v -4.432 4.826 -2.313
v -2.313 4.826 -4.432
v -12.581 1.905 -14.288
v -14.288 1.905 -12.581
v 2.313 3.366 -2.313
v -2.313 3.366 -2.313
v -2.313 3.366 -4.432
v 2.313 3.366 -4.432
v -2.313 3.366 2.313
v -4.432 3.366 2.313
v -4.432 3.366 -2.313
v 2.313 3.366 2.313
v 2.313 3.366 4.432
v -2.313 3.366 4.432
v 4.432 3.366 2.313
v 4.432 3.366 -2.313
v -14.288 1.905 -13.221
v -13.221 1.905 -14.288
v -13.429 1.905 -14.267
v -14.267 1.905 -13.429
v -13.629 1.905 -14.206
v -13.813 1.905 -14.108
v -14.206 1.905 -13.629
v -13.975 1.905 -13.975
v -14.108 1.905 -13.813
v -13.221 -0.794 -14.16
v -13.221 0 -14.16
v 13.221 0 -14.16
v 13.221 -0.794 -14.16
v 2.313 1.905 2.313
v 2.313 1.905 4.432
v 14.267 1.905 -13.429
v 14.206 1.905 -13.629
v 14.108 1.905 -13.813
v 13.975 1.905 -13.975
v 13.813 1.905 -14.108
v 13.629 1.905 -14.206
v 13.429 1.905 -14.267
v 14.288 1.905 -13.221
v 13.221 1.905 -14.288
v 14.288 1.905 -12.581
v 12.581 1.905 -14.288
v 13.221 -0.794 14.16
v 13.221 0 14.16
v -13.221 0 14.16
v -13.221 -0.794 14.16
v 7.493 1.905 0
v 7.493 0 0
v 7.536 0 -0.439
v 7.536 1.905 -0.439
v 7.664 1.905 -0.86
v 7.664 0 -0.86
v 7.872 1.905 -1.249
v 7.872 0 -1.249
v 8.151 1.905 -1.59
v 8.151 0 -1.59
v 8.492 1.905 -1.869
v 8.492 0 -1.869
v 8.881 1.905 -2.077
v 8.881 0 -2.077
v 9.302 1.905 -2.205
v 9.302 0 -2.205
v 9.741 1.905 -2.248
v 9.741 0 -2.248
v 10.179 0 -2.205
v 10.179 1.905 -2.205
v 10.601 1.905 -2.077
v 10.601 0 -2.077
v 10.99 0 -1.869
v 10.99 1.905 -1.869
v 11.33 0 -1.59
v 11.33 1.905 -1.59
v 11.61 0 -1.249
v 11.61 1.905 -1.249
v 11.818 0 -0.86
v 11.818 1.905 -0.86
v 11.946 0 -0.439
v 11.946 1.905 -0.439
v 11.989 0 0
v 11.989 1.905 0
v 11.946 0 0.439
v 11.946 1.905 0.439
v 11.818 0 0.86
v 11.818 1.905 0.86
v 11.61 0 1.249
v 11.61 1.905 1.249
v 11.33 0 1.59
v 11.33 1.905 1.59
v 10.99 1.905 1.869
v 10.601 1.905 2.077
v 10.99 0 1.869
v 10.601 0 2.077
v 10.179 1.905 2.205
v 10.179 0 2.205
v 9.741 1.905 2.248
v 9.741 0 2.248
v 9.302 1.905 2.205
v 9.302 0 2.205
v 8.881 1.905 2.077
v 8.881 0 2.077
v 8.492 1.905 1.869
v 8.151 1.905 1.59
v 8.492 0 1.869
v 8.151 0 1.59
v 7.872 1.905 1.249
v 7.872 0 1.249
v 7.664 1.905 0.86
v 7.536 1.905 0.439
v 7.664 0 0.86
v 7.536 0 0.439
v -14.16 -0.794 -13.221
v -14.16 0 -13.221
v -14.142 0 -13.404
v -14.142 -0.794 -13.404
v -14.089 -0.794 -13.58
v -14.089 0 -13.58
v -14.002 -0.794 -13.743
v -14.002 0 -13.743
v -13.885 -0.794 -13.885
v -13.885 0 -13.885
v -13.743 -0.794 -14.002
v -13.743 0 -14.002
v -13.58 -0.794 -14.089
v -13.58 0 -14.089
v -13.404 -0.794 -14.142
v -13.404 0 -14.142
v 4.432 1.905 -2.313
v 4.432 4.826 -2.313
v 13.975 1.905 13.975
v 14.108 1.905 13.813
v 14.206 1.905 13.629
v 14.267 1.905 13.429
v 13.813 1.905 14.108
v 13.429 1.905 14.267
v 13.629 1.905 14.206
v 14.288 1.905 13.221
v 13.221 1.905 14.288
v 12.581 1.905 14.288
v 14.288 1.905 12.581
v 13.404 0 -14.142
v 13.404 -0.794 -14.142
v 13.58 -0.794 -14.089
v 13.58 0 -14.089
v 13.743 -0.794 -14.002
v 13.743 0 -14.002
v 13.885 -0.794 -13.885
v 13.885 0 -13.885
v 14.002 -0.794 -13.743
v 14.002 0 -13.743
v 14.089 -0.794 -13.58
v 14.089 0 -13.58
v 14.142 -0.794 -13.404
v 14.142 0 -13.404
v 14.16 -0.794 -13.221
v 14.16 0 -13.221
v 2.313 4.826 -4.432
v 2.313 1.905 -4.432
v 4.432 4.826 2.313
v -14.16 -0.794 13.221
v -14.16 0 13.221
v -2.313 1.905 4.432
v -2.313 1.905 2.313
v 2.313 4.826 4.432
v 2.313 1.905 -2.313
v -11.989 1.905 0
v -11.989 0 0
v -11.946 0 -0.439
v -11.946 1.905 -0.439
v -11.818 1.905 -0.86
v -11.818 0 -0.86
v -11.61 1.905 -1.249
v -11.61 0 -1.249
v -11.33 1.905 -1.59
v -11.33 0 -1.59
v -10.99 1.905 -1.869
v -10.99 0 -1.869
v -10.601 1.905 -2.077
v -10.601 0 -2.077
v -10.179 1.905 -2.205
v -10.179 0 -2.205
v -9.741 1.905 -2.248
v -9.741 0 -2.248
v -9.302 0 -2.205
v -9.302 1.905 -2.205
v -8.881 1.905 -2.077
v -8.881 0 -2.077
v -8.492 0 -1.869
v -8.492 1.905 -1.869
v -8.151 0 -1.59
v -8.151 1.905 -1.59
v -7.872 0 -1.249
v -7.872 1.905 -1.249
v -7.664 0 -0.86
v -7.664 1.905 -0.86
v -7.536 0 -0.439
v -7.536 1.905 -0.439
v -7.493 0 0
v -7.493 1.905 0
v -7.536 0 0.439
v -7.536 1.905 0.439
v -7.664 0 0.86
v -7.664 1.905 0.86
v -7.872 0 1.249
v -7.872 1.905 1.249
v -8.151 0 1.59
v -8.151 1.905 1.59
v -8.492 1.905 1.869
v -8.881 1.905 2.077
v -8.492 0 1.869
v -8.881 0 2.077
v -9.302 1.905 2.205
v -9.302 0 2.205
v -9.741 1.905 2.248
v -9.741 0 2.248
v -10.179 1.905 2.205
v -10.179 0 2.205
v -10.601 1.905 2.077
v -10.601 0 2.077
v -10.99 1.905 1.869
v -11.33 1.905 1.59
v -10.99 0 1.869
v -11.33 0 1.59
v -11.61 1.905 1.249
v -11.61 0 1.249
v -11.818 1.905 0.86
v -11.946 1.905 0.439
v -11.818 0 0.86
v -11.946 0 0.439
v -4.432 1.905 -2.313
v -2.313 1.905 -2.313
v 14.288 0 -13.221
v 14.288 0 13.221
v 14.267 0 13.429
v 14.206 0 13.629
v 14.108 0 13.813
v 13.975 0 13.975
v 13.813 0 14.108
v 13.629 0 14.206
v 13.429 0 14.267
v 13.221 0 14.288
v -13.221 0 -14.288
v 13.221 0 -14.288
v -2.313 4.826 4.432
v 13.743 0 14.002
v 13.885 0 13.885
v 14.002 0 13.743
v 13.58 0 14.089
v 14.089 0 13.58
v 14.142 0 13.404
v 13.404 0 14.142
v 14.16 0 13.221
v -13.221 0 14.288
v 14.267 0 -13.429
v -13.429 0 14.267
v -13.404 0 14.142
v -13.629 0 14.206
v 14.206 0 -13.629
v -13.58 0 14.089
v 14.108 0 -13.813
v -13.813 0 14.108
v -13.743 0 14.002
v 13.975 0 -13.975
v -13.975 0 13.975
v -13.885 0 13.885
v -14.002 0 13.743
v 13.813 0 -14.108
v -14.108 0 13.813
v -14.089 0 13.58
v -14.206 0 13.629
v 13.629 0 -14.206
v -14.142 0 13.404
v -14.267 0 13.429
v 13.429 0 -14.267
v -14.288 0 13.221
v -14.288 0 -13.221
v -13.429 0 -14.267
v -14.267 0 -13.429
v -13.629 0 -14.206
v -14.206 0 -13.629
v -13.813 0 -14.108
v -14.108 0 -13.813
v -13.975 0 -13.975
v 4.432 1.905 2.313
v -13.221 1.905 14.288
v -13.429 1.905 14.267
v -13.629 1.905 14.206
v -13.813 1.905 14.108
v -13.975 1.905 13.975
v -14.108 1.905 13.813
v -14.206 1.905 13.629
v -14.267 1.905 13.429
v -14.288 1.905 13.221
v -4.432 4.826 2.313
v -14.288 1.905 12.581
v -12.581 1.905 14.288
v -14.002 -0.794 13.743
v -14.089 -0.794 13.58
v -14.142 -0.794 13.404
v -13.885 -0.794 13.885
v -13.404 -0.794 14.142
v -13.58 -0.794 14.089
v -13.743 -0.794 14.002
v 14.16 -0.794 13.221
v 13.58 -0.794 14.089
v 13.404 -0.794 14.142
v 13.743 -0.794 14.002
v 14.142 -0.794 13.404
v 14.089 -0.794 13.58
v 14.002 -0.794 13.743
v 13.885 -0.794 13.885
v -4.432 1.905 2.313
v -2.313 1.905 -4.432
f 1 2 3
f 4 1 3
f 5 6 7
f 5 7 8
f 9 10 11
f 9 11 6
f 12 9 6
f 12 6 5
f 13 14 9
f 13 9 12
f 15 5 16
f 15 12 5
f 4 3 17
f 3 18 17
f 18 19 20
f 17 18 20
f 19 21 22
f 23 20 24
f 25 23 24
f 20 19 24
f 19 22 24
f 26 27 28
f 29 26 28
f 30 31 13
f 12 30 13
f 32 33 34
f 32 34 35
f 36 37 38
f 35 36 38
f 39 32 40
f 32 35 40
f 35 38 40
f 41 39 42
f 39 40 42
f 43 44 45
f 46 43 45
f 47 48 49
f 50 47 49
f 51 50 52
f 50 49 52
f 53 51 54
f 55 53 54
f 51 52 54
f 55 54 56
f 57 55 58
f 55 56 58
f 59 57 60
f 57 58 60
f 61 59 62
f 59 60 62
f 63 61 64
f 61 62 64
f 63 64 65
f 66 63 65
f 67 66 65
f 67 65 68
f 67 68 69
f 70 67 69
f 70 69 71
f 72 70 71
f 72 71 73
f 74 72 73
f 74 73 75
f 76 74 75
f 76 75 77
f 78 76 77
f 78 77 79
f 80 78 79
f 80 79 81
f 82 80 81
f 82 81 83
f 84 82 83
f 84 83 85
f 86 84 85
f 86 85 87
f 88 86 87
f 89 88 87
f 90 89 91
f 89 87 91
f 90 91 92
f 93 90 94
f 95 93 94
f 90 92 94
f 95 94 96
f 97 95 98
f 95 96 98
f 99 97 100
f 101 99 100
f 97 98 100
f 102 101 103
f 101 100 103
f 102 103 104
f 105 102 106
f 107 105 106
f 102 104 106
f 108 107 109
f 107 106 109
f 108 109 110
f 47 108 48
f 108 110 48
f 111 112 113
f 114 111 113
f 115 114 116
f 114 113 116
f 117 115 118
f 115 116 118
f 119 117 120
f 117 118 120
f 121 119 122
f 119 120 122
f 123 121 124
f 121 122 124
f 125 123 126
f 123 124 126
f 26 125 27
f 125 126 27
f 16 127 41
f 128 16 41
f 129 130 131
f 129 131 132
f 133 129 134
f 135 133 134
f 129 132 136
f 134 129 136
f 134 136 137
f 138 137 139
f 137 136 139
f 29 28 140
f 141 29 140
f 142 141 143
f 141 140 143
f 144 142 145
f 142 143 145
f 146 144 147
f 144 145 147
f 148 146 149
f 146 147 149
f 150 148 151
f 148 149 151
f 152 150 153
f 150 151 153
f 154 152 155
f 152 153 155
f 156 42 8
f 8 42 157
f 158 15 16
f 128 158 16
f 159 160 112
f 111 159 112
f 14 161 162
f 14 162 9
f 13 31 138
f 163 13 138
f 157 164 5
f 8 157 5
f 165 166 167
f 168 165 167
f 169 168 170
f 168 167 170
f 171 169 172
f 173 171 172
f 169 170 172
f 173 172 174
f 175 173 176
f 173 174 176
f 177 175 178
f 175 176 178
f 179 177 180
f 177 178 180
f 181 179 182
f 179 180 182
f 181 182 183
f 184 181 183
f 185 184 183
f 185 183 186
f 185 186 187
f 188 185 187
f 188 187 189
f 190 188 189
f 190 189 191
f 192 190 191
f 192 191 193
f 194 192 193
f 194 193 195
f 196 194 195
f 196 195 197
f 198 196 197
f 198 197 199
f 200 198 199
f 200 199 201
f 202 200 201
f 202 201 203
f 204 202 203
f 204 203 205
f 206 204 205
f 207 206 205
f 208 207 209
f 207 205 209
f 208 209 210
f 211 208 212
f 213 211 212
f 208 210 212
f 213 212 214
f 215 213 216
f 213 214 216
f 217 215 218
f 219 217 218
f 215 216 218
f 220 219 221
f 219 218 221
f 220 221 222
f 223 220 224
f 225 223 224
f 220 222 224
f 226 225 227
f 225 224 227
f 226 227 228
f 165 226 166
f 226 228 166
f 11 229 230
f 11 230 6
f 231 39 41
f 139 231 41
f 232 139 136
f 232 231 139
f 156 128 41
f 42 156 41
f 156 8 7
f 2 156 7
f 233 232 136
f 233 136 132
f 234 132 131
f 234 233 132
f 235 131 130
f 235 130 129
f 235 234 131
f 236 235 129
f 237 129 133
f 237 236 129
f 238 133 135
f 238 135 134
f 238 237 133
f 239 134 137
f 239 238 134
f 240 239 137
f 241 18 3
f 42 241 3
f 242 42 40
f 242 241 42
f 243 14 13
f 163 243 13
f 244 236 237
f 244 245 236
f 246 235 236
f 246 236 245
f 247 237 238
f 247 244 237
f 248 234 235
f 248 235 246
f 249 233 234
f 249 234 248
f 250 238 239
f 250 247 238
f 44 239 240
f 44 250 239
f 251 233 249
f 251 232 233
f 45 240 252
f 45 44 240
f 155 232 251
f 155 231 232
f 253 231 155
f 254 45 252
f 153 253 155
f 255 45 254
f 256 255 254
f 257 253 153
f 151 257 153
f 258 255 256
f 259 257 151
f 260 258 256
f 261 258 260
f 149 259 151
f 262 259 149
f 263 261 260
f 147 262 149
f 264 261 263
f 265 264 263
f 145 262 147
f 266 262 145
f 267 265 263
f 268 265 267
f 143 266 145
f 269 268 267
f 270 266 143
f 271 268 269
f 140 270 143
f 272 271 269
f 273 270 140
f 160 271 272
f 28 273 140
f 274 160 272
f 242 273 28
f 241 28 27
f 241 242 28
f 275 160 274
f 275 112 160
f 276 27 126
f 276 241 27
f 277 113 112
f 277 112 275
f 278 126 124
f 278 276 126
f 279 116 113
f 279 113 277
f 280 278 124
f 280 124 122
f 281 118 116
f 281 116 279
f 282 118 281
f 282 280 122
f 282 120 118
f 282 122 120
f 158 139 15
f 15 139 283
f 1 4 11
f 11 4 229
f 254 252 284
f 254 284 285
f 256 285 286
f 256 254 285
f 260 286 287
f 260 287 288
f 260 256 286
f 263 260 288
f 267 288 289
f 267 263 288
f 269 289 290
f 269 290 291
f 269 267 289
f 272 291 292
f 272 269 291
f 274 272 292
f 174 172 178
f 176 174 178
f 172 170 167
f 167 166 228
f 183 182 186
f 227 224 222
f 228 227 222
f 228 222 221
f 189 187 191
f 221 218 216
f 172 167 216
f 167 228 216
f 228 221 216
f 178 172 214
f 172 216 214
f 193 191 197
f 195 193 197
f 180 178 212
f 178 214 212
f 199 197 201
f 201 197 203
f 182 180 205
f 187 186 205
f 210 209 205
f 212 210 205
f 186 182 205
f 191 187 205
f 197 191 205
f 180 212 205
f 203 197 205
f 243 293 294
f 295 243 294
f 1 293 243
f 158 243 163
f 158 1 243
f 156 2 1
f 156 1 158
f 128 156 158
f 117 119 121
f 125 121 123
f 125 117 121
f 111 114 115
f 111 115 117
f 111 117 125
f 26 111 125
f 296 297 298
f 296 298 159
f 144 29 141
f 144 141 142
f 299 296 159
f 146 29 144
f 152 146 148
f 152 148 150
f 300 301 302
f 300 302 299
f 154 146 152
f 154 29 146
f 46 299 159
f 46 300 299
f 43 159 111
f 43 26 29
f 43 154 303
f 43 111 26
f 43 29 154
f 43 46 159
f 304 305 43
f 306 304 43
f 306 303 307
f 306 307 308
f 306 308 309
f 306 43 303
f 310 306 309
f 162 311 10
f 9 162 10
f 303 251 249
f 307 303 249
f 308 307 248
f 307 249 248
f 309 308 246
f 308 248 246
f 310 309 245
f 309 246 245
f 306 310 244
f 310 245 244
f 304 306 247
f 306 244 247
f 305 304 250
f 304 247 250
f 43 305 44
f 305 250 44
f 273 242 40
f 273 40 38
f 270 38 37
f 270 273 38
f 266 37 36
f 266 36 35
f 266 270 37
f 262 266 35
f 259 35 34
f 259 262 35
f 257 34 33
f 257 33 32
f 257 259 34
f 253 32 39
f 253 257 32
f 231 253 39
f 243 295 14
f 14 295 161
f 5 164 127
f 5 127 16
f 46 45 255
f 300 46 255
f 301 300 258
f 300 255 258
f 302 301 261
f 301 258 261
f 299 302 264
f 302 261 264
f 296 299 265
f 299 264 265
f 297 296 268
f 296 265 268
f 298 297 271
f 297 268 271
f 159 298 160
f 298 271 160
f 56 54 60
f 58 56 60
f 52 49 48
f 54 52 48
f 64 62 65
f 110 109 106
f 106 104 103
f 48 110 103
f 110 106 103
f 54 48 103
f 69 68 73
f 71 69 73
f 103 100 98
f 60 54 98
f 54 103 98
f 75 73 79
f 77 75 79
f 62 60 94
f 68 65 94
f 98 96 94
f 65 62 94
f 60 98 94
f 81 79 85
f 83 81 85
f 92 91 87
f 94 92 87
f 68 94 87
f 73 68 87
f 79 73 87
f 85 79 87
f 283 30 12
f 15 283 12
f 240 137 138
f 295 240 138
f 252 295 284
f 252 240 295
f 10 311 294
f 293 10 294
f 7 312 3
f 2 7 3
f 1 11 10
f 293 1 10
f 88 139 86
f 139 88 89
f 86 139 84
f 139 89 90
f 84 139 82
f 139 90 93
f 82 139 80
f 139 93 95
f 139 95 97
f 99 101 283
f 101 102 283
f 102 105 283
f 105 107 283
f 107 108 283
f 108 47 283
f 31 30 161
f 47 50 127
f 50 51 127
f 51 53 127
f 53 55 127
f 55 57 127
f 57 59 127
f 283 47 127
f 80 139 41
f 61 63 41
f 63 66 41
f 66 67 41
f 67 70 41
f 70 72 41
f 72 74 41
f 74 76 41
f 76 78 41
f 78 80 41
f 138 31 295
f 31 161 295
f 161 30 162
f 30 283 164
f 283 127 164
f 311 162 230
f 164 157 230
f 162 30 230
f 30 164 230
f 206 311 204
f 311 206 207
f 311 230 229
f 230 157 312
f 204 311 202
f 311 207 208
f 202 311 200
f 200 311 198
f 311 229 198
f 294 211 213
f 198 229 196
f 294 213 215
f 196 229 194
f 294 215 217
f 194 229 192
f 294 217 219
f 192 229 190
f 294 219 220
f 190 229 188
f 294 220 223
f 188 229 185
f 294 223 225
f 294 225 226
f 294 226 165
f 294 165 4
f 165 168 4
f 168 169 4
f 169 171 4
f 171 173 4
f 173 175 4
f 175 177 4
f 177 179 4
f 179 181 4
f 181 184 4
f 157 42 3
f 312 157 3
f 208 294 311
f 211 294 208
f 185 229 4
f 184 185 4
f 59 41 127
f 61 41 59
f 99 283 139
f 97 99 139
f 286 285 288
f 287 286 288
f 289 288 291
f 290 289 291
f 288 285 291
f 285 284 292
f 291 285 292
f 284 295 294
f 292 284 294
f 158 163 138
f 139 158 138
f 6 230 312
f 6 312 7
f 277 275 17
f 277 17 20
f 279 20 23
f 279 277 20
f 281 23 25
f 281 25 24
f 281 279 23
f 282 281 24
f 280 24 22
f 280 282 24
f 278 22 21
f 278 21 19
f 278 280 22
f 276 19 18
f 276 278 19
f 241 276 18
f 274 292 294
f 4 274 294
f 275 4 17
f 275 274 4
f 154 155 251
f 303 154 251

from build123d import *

# Parameters (mm, degrees)
BOSS_EXTRUDE1_DEPTH   = 1.905
BOSS_EXTRUDE2_DEPTH   = 2.921
CUT_EXTRUDE2_DEPTH    = 21.773916061
CIRPATTERN3_COUNT     = 4
SKETCH5_W             = 4.62591911
SKETCH5_H             = 1.4605
CUT_EXTRUDE3_DEPTH    = 25.03859073
CIRPATTERN4_COUNT     = 4
F_8_CLEARANCE_HOLE1_D = 4.4958
BOSS_EXTRUDE3_DEPTH   = 0.79375


with BuildPart() as part:
    # Sketch1 → Boss-Extrude1 (new body)
    with BuildSketch(Plane(origin=(0, 0, 0), x_dir=(1, 0, 0), z_dir=(0, 1, 0))):
        with BuildLine():
            Line((13.2207, -14.2875), (-13.2207, -14.2875))
            ThreePointArc((-13.2207, -14.2875), (-13.975041514, -13.975041514), (-14.2875, -13.2207))
            Line((-14.2875, -13.2207), (-14.2875, 13.2207))
            ThreePointArc((-14.2875, 13.2207), (-13.975041514, 13.975041514), (-13.2207, 14.2875))
            Line((-13.2207, 14.2875), (13.2207, 14.2875))
            ThreePointArc((13.2207, 14.2875), (13.975041514, 13.975041514), (14.2875, 13.2207))
            Line((14.2875, 13.2207), (14.2875, -13.2207))
            ThreePointArc((14.2875, -13.2207), (13.975041514, -13.975041514), (13.2207, -14.2875))
        make_face()
    extrude(amount=BOSS_EXTRUDE1_DEPTH)

    # Sketch2 → Boss-Extrude2 (add)
    with BuildSketch(Plane(origin=(0, 1.905, 0), x_dir=(1, 0, 0), z_dir=(0, 1, 0))):
        Polygon((4.4323, -2.312959555), (4.4323, 2.312959555), (14.2875, 12.581251337), (12.581251337, 14.2875), (2.312959555, 4.4323), (-2.312959555, 4.4323), (-12.581251337, 14.2875), (-14.2875, 12.581251337), (-4.4323, 2.312959555), (-4.4323, -2.312959555), (-14.2875, -12.581251337), (-12.581251337, -14.2875), (-2.312959555, -4.4323), (2.312959555, -4.4323), (12.581251337, -14.2875), (14.2875, -12.581251337), align=None)
    extrude(amount=BOSS_EXTRUDE2_DEPTH)

    # Sketch4 → Cut-Extrude2 (cut, symmetric)
    with BuildSketch(Plane(origin=(0, 0, 0), x_dir=(0, -1, 0), z_dir=(0.7071067811865488, 0, 0.7071067811865464))):
        Polygon((-4.826, 4.769618773), (-1.905, 18.999076272), (-4.826, 18.999076272), align=None)
    cut_extrude2 = extrude(amount=CUT_EXTRUDE2_DEPTH, both=True, mode=Mode.SUBTRACT)

    # CirPattern3: Cut-Extrude2 ×4 about axis
    cirpattern3_axis = Axis((0, 5.0673, 0), (0, -1, 0))
    for i in range(1, CIRPATTERN3_COUNT):
        add(cut_extrude2.rotate(cirpattern3_axis, i * 360 / CIRPATTERN3_COUNT), mode=Mode.SUBTRACT)

    # Sketch5 → Cut-Extrude3 (cut, through all)
    with BuildSketch(Plane.XY.offset(4.4323)):
        with Locations((0, 2.63525)):
            Rectangle(SKETCH5_W, SKETCH5_H)
    cut_extrude3 = extrude(amount=-CUT_EXTRUDE3_DEPTH, mode=Mode.SUBTRACT)

    # CirPattern4: Cut-Extrude3 ×4 about axis
    cirpattern4_axis = Axis((0, 5.0673, 0), (0, -1, 0))
    for i in range(1, CIRPATTERN4_COUNT):
        add(cut_extrude3.rotate(cirpattern4_axis, i * 360 / CIRPATTERN4_COUNT), mode=Mode.SUBTRACT)

    # #8 Clearance Hole1 (through all)
    with Locations(Plane(origin=(0, 1.905, 0), x_dir=(1, 0, 0), z_dir=(0, 1, 0))):
        with Locations((-9.7409, 0), (9.7409, 0)):
            Hole(F_8_CLEARANCE_HOLE1_D / 2)

    # Sketch6 → Boss-Extrude3 (add)
    with BuildSketch(Plane.XZ):
        with BuildLine():
            Line((-14.1605, 13.2207), (-14.1605, -13.2207))
            ThreePointArc((-14.1605, -13.2207), (-13.885238953, -13.885238953), (-13.2207, -14.1605))
            Line((-13.2207, -14.1605), (13.2207, -14.1605))
            ThreePointArc((13.2207, -14.1605), (13.885238953, -13.885238953), (14.1605, -13.2207))
            Line((14.1605, -13.2207), (14.1605, 13.2207))
            ThreePointArc((14.1605, 13.2207), (13.885238953, 13.885238953), (13.2207, 14.1605))
            Line((13.2207, 14.1605), (-13.2207, 14.1605))
            ThreePointArc((-13.2207, 14.1605), (-13.885238953, 13.885238953), (-14.1605, 13.2207))
        make_face()
    extrude(amount=BOSS_EXTRUDE3_DEPTH)


solid = part.part
